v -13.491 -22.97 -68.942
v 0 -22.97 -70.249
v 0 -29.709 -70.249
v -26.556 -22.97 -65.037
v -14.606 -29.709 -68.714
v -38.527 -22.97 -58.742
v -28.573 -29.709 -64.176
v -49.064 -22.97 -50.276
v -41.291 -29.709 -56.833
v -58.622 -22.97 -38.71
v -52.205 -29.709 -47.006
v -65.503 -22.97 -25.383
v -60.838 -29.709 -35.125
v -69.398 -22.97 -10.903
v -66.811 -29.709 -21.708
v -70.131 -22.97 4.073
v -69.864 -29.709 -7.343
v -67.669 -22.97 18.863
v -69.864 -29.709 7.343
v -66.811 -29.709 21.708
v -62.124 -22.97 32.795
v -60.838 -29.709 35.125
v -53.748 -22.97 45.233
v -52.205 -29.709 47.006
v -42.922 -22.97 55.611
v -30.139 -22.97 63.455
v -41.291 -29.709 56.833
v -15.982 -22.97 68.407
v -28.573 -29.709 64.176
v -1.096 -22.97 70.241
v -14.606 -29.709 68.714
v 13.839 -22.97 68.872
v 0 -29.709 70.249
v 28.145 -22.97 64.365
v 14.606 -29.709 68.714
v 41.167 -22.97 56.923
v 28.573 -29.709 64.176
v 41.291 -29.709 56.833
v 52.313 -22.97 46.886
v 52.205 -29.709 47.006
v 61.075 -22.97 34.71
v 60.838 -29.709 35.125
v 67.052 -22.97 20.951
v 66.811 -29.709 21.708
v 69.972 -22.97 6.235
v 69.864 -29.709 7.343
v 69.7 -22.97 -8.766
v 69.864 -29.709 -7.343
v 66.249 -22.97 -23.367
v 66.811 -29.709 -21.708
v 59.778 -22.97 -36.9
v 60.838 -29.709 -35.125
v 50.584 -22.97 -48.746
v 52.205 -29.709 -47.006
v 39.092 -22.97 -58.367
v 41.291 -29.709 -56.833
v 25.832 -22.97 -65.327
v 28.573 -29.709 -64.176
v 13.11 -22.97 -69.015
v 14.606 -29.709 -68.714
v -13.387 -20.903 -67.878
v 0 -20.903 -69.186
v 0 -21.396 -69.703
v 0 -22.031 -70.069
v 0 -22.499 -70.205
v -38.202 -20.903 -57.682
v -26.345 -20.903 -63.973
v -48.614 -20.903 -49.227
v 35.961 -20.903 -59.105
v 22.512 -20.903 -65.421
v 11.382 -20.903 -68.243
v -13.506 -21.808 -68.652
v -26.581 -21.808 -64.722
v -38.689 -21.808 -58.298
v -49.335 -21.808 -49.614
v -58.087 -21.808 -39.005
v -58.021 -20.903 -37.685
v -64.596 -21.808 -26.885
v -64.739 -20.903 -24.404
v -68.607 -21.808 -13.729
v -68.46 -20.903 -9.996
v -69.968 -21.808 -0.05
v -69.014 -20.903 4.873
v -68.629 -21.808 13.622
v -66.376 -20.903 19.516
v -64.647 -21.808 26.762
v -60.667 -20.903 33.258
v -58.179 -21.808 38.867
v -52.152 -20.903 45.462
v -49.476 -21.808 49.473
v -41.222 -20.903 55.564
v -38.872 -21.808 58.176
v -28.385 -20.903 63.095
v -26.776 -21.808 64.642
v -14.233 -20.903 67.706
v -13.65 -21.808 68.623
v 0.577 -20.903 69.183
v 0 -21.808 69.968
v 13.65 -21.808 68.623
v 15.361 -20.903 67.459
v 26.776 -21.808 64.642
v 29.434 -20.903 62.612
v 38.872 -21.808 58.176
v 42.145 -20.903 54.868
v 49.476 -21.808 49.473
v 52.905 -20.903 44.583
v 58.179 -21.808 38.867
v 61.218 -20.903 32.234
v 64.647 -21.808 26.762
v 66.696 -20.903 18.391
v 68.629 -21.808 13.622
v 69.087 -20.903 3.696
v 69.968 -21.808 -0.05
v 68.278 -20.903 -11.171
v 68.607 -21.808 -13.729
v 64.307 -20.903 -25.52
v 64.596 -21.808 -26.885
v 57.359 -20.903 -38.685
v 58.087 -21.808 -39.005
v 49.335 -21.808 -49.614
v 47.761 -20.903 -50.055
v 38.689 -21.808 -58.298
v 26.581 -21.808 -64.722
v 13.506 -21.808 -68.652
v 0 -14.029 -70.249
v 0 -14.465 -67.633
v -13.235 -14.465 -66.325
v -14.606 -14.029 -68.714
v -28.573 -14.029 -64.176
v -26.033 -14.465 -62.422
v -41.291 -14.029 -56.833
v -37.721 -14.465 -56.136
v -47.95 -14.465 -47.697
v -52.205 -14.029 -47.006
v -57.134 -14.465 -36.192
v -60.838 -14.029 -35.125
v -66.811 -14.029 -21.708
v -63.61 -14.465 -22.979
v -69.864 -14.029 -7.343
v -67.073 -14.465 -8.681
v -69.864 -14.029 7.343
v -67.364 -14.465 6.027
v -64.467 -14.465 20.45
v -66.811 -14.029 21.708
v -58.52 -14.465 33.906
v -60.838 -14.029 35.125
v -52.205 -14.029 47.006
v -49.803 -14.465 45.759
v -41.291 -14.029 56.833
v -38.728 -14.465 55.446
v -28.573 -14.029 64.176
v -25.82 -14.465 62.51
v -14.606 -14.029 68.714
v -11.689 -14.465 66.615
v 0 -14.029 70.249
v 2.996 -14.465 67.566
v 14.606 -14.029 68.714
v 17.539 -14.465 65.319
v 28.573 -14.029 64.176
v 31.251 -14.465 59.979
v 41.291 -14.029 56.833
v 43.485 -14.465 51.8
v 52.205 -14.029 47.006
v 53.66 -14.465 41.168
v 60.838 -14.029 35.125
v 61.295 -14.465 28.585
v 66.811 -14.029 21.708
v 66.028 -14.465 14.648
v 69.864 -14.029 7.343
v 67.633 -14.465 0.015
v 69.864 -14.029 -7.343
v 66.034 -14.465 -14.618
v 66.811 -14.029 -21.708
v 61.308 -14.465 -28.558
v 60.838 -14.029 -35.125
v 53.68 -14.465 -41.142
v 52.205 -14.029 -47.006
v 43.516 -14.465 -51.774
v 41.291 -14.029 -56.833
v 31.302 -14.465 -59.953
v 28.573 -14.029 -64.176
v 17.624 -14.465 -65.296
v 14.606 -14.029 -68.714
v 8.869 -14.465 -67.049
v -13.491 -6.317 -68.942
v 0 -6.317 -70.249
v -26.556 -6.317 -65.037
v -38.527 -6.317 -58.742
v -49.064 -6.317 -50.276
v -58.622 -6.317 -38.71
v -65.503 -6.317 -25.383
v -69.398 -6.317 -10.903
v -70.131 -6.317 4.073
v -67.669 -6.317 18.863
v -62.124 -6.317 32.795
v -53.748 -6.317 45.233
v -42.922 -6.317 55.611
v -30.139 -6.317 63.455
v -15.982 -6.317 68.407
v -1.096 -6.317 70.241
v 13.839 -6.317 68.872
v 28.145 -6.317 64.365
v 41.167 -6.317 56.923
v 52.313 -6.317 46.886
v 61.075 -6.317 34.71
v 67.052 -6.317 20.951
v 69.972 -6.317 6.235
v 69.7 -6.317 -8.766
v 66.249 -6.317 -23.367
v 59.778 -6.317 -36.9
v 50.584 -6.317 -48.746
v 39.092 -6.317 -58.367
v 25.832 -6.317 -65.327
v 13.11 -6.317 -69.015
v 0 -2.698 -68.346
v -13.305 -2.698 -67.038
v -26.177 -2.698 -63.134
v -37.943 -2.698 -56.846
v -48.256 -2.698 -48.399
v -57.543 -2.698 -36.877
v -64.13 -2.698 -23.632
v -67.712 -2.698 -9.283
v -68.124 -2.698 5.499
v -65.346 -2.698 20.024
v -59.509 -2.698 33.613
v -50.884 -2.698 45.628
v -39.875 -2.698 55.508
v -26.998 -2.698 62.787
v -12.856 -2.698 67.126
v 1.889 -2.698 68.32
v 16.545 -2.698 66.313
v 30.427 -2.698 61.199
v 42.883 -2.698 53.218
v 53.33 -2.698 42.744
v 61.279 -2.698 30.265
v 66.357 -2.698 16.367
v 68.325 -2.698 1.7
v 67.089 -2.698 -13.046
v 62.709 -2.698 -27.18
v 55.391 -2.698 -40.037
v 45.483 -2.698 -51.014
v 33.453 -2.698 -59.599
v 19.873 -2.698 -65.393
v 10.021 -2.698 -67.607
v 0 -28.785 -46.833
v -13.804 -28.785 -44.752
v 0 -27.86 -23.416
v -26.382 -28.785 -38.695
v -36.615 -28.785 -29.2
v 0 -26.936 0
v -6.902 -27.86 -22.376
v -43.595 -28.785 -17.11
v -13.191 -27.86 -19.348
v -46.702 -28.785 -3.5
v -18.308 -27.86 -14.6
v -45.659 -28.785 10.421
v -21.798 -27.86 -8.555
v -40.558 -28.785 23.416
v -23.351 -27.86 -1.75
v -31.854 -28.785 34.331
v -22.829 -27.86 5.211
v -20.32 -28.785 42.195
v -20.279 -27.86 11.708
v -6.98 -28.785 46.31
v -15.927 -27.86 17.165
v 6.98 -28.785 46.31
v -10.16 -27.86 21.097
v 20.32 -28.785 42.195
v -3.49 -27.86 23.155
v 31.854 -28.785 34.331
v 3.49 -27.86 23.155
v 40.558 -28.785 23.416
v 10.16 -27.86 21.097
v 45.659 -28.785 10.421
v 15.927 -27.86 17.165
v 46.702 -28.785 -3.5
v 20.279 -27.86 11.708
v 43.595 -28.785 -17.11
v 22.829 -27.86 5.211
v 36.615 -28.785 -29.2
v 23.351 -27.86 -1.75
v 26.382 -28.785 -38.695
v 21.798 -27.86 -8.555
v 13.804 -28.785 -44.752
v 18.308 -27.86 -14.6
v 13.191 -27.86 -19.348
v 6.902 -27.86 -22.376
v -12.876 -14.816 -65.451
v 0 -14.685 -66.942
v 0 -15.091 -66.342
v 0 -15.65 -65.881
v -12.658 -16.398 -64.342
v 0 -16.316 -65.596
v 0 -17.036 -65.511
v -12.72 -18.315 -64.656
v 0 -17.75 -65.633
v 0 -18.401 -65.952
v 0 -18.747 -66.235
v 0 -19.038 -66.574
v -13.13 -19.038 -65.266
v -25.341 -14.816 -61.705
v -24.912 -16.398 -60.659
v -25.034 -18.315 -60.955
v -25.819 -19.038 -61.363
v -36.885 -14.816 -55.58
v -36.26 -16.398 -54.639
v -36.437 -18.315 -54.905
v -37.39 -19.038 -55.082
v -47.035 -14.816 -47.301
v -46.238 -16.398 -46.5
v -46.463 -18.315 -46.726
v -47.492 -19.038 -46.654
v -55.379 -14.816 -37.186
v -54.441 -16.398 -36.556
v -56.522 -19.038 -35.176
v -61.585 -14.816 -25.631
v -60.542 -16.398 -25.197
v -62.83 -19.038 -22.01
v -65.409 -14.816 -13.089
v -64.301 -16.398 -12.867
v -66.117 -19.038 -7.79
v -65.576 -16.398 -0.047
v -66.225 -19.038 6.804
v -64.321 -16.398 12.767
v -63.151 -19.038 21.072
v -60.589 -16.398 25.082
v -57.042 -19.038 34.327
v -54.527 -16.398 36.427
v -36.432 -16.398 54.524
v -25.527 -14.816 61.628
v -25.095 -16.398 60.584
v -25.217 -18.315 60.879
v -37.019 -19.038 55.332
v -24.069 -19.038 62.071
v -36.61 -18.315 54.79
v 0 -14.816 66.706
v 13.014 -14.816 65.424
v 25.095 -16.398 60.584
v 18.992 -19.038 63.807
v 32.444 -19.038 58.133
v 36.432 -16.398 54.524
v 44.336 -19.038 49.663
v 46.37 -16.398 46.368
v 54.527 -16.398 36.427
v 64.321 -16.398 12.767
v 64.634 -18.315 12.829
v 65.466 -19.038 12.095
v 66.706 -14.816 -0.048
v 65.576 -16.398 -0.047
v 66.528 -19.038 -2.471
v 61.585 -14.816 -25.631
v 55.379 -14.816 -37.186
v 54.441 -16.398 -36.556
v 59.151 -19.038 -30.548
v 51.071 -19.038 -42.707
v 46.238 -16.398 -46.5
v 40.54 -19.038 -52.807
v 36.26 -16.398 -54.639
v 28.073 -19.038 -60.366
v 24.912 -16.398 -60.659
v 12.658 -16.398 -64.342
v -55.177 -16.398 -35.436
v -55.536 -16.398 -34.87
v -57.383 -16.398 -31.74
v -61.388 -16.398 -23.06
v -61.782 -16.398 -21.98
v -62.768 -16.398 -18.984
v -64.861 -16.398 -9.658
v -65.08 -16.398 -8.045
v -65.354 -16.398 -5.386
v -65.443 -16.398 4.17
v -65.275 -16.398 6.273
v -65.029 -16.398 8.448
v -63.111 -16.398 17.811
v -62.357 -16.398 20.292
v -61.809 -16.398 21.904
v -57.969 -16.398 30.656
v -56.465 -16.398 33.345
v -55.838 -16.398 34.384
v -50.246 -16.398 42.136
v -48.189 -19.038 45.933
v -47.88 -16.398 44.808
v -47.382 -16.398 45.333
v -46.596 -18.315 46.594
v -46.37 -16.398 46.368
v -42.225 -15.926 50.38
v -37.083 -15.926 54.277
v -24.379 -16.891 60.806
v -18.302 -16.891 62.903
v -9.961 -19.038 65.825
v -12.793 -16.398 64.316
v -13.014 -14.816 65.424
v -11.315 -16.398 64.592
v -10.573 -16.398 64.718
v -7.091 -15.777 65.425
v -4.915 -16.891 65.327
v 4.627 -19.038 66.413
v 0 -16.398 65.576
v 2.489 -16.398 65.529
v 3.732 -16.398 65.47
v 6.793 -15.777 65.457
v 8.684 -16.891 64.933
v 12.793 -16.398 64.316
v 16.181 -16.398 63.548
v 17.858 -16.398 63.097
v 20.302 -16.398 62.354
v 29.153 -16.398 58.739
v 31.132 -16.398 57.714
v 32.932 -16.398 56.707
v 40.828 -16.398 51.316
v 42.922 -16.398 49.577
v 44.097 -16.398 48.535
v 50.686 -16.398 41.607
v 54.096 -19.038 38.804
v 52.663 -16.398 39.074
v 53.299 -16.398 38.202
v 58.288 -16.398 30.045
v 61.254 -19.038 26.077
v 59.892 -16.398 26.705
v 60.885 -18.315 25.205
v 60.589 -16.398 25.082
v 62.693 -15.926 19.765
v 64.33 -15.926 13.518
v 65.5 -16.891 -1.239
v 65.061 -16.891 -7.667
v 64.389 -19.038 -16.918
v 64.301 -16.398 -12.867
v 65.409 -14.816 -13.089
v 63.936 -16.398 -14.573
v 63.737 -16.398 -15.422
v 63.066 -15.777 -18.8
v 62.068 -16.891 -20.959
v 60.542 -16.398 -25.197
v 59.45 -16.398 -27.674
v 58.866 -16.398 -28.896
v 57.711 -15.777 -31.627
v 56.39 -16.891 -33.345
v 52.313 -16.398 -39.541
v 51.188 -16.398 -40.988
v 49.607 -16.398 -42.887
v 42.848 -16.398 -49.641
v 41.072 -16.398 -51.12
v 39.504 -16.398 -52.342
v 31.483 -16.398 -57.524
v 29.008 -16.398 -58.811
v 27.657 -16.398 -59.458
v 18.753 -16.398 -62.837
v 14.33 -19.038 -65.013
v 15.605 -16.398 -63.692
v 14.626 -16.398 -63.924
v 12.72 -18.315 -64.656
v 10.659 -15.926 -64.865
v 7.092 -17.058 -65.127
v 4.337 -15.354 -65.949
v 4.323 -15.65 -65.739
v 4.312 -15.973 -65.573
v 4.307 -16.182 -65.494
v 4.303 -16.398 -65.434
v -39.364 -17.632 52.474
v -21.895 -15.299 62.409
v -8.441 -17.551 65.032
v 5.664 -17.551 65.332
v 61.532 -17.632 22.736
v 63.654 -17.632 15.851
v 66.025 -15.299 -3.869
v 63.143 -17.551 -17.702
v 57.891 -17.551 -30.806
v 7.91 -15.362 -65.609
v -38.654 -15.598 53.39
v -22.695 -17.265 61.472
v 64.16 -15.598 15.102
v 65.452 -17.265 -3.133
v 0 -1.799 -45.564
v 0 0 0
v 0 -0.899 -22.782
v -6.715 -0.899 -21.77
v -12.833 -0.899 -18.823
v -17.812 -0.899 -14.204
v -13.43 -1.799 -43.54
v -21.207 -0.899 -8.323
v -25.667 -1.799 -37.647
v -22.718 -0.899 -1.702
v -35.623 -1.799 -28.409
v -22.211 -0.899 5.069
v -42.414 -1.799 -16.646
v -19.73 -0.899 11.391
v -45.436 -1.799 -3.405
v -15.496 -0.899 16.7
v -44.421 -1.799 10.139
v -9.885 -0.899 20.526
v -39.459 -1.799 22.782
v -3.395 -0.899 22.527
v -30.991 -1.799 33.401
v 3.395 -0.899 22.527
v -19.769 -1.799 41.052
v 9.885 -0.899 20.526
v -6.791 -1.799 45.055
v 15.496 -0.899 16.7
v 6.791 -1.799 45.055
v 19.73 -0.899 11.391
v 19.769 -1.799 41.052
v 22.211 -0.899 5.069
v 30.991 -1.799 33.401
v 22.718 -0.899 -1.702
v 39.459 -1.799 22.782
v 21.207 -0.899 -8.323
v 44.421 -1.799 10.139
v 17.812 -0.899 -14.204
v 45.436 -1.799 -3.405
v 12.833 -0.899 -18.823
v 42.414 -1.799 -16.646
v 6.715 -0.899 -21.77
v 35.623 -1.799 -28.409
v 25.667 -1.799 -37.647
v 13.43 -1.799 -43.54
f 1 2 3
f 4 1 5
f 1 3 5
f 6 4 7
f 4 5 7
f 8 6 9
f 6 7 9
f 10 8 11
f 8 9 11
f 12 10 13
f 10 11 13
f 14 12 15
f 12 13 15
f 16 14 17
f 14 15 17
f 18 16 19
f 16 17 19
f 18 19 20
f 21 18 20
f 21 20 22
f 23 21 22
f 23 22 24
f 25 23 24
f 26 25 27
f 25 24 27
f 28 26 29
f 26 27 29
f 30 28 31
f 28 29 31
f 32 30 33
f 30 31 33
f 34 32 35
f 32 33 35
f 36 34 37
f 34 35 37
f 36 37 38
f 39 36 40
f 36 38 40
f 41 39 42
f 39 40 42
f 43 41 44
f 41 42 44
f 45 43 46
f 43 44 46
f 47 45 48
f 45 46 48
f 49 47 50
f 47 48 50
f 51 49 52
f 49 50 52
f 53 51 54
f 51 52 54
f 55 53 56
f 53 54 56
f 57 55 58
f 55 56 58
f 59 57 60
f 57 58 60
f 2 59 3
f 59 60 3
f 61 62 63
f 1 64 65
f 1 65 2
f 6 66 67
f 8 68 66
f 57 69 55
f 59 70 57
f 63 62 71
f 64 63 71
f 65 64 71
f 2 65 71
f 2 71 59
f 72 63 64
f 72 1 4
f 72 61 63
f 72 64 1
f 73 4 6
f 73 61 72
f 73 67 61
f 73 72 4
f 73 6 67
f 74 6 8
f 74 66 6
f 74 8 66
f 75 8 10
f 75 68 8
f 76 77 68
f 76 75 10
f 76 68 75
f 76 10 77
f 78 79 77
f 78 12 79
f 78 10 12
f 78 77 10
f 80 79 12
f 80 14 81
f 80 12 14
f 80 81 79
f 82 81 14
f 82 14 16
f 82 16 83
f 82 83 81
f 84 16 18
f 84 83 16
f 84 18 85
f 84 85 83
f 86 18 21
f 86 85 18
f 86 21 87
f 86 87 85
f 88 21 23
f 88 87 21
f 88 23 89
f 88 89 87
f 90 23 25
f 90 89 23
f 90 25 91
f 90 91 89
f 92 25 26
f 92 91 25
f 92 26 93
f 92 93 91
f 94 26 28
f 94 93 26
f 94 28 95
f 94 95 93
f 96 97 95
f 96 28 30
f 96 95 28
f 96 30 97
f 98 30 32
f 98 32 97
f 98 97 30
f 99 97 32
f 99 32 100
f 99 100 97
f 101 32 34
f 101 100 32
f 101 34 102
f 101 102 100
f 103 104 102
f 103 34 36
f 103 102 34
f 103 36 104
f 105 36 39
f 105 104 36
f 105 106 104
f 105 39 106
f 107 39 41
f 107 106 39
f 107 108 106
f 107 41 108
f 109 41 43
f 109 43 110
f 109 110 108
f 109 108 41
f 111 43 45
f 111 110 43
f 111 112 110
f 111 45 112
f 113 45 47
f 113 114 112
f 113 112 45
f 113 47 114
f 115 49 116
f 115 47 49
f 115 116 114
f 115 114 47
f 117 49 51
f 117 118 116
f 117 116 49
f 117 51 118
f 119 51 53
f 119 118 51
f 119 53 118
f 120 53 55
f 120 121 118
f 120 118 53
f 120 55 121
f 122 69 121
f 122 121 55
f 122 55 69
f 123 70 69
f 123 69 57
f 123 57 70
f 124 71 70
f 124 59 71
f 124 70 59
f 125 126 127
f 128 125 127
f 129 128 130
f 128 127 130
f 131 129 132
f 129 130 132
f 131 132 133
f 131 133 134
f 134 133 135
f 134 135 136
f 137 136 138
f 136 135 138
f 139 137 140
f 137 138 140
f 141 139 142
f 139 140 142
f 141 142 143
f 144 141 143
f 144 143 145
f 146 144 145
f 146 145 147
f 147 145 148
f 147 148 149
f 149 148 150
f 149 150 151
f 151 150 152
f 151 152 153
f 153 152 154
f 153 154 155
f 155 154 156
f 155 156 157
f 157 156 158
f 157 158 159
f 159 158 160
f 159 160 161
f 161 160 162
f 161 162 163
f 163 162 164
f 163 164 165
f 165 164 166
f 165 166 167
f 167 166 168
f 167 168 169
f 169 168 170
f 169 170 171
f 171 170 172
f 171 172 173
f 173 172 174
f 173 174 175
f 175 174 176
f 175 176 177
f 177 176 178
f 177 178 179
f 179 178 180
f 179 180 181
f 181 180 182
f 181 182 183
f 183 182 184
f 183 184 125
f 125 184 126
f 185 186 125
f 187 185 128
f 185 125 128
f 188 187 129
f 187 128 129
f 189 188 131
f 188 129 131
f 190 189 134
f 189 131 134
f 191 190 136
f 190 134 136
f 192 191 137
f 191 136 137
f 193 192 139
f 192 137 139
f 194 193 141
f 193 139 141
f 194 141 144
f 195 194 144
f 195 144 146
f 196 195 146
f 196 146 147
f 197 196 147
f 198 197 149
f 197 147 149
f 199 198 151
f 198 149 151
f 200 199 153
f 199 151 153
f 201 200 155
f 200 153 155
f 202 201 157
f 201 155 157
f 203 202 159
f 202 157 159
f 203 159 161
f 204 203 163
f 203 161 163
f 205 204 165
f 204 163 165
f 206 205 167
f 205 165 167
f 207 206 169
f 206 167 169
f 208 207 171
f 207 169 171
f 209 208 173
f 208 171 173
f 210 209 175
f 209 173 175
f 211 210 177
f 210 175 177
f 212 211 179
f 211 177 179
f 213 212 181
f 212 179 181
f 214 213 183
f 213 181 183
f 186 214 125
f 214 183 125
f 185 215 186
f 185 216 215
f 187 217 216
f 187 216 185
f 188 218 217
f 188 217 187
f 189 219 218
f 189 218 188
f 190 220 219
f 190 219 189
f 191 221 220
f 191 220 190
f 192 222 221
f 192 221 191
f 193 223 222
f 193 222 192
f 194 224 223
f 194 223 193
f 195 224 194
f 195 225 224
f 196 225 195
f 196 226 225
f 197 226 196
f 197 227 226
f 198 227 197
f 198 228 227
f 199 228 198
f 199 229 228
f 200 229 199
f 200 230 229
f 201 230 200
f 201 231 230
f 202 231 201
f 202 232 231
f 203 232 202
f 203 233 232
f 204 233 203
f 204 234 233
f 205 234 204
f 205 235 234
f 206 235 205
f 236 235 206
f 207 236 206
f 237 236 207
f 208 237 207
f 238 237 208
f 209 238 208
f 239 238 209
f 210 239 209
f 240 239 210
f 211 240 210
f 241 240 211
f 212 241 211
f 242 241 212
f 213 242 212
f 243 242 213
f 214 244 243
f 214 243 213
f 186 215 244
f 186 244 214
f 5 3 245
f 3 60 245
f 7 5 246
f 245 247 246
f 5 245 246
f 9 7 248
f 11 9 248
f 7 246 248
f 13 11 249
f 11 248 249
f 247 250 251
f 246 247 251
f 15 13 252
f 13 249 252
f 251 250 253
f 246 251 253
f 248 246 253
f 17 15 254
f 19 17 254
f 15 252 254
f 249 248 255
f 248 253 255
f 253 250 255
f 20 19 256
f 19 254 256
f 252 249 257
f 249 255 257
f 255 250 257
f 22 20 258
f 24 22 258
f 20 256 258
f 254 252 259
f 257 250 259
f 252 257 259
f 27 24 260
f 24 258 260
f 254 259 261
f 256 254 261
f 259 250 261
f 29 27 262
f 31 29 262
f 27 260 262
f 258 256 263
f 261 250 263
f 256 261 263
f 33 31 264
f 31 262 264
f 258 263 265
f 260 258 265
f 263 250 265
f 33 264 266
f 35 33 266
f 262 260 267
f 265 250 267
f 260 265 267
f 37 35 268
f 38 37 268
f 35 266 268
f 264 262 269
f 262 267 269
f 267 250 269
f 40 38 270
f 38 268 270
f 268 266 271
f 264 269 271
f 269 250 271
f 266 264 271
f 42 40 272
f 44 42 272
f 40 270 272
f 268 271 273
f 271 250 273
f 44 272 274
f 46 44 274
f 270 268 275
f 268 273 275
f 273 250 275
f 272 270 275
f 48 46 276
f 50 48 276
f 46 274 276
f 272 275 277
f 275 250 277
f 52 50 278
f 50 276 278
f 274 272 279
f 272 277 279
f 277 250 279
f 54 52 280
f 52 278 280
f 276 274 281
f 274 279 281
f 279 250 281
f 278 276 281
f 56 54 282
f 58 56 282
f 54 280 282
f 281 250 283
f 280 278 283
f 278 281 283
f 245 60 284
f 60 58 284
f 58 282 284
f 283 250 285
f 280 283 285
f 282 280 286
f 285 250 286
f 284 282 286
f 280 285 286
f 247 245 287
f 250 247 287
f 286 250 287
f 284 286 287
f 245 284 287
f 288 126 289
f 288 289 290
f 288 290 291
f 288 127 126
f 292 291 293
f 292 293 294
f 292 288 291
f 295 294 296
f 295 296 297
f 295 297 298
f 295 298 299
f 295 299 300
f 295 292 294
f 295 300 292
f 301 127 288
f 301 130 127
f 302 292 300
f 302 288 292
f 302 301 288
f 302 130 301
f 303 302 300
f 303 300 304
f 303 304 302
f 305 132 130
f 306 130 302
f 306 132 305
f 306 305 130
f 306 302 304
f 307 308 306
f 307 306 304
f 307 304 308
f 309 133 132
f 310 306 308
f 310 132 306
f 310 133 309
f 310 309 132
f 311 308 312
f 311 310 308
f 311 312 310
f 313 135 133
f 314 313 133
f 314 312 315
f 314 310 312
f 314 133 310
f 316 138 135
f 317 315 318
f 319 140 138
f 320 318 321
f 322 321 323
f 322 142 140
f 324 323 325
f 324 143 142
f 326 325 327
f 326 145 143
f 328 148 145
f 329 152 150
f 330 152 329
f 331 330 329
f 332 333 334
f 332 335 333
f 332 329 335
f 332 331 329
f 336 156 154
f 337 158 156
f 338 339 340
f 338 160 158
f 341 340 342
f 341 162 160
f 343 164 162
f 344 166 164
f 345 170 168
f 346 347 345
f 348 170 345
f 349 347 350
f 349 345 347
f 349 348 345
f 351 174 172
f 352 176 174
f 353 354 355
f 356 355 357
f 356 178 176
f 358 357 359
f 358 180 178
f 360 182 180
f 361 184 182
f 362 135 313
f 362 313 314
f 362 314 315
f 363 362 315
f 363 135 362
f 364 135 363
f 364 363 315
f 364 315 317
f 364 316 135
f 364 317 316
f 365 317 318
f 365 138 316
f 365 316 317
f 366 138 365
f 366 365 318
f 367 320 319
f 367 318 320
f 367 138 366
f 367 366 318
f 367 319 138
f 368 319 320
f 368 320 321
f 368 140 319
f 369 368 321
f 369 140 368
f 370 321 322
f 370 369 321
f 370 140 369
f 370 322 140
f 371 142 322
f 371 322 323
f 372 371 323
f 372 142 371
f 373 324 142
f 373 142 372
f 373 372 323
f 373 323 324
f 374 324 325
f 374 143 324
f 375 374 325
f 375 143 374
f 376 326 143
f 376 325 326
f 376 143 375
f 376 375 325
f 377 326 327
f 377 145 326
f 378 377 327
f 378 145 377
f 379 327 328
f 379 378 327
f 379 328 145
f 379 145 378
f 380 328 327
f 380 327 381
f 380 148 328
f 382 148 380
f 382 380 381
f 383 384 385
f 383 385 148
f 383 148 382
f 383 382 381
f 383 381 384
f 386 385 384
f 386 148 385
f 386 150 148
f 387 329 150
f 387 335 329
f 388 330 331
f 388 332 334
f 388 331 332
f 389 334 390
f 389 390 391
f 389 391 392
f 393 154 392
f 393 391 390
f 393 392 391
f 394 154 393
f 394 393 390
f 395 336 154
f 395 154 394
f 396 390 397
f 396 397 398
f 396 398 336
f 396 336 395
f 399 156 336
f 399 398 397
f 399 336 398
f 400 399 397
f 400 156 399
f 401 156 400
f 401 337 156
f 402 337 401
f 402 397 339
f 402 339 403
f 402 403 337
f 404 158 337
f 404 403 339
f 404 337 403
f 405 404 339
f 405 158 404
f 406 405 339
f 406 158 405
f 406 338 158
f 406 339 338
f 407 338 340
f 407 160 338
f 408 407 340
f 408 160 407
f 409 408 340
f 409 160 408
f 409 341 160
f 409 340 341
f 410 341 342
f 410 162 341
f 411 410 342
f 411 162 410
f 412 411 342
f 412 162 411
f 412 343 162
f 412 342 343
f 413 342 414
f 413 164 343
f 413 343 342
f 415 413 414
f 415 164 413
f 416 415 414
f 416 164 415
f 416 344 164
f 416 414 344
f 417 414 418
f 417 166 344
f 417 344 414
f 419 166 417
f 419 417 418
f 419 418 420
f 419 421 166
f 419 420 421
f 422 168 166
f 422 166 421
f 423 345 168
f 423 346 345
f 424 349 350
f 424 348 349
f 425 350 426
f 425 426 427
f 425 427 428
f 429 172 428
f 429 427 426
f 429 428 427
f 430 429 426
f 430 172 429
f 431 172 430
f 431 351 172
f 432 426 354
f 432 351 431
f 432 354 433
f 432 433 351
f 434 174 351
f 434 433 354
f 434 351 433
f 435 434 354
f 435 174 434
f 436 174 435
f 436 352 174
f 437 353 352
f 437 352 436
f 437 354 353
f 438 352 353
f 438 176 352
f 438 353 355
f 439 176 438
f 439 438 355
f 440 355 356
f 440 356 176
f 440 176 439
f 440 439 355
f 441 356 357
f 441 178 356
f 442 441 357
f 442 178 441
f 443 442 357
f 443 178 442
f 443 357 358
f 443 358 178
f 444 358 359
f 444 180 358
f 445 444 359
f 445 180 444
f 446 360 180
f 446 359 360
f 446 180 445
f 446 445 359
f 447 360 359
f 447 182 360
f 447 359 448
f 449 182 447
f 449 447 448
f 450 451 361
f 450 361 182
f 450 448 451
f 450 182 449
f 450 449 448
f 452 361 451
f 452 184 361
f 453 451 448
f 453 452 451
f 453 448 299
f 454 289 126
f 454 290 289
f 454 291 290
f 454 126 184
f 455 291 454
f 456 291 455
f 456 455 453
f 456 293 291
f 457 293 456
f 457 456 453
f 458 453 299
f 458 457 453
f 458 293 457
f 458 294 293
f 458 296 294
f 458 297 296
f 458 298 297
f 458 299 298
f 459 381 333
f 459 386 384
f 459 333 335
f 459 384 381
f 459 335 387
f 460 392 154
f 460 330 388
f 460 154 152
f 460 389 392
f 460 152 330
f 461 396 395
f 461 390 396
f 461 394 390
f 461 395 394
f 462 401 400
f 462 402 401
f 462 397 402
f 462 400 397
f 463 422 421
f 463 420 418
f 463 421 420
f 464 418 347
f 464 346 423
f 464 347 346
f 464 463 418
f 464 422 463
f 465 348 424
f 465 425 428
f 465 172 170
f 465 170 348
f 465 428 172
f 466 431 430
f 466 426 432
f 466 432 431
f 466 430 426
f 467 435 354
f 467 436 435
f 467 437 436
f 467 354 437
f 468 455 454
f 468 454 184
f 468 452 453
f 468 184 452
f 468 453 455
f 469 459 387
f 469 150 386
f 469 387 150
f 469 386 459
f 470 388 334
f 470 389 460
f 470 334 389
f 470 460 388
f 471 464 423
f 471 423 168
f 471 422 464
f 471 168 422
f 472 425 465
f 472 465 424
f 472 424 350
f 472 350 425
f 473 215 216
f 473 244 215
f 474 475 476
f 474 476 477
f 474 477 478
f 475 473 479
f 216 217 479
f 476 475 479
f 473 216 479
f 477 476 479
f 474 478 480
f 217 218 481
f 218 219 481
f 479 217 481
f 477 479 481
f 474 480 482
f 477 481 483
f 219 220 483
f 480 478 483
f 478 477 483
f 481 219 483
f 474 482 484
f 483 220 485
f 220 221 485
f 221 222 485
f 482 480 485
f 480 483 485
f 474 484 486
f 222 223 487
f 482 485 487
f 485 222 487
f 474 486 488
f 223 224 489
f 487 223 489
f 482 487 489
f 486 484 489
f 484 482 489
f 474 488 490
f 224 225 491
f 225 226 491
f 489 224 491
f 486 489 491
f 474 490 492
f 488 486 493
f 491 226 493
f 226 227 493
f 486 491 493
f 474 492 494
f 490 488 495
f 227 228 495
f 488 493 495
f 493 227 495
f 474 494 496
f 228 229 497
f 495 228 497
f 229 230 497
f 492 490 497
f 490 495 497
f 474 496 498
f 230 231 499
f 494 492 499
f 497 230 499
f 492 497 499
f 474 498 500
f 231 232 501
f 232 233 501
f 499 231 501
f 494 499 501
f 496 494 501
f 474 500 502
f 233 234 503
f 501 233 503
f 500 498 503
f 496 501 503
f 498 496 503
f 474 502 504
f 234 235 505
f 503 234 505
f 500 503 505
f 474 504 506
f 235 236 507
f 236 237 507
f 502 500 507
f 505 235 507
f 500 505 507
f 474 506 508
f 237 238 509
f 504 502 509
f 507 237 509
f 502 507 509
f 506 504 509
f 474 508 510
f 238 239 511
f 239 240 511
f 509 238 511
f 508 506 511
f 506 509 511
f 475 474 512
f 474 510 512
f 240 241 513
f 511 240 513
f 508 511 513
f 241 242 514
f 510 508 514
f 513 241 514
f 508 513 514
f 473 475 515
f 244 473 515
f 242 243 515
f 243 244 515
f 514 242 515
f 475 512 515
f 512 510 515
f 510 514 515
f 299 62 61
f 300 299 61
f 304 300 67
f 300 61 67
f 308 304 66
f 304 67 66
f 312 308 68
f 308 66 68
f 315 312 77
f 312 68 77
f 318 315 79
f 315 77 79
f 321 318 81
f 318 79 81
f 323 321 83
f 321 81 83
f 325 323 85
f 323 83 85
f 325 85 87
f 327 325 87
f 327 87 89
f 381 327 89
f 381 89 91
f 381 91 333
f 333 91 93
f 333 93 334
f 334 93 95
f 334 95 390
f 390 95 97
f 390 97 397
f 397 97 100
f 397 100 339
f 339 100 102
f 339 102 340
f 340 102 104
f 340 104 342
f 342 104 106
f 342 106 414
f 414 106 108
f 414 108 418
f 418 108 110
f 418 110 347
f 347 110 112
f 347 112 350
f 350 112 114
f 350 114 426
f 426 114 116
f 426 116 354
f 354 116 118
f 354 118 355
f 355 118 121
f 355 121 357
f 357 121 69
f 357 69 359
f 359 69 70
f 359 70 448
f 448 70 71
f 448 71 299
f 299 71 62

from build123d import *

# Parameters (mm, degrees)
FILLET1_R      = 2.54
CHAMFER1_SIZE  = 1.905
CHAMFER1_SIZE2 = 3.544462864


with BuildPart() as part:
    # Sketch1 → Revolve1 (revolve)
    with BuildSketch(Plane.XY, mode=Mode.PRIVATE) as revolve1_sk:
        Polygon((0, 0), (70.24917533, -2.772993763), (70.24917533, -14.029203884), (61.584078813, -15.473386637), (70.24917533, -21.662741291), (70.24917533, -29.708902342), (0, -26.935908579), align=None)
    revolve(revolve1_sk.sketch.rotate(Axis((0, -26.935908579, 0), (0, 1, 0)), 90), axis=Axis((0, -26.935908579, 0), (0, 1, 0)))

    # Fillet1
    fillet1_edges = [part.edges().sort_by_distance(p)[0] for p in [
        (0, -21.662741291, 70.24917533),
        (0, -15.473386637, 61.584078813),
    ]]
    fillet(fillet1_edges, radius=FILLET1_R)

    # Chamfer1
    chamfer1_edges = [part.edges().sort_by_distance(p)[0] for p in [
        (0, -2.772993763, 70.24917533),
    ]]
    chamfer1_side = [part.faces().sort_by_distance(p)[0] for p in [
        (0, -1.386496882, 35.124587665),
    ]]
    chamfer(chamfer1_edges, length=CHAMFER1_SIZE, length2=CHAMFER1_SIZE2, reference=chamfer1_side[0])


solid = part.part
